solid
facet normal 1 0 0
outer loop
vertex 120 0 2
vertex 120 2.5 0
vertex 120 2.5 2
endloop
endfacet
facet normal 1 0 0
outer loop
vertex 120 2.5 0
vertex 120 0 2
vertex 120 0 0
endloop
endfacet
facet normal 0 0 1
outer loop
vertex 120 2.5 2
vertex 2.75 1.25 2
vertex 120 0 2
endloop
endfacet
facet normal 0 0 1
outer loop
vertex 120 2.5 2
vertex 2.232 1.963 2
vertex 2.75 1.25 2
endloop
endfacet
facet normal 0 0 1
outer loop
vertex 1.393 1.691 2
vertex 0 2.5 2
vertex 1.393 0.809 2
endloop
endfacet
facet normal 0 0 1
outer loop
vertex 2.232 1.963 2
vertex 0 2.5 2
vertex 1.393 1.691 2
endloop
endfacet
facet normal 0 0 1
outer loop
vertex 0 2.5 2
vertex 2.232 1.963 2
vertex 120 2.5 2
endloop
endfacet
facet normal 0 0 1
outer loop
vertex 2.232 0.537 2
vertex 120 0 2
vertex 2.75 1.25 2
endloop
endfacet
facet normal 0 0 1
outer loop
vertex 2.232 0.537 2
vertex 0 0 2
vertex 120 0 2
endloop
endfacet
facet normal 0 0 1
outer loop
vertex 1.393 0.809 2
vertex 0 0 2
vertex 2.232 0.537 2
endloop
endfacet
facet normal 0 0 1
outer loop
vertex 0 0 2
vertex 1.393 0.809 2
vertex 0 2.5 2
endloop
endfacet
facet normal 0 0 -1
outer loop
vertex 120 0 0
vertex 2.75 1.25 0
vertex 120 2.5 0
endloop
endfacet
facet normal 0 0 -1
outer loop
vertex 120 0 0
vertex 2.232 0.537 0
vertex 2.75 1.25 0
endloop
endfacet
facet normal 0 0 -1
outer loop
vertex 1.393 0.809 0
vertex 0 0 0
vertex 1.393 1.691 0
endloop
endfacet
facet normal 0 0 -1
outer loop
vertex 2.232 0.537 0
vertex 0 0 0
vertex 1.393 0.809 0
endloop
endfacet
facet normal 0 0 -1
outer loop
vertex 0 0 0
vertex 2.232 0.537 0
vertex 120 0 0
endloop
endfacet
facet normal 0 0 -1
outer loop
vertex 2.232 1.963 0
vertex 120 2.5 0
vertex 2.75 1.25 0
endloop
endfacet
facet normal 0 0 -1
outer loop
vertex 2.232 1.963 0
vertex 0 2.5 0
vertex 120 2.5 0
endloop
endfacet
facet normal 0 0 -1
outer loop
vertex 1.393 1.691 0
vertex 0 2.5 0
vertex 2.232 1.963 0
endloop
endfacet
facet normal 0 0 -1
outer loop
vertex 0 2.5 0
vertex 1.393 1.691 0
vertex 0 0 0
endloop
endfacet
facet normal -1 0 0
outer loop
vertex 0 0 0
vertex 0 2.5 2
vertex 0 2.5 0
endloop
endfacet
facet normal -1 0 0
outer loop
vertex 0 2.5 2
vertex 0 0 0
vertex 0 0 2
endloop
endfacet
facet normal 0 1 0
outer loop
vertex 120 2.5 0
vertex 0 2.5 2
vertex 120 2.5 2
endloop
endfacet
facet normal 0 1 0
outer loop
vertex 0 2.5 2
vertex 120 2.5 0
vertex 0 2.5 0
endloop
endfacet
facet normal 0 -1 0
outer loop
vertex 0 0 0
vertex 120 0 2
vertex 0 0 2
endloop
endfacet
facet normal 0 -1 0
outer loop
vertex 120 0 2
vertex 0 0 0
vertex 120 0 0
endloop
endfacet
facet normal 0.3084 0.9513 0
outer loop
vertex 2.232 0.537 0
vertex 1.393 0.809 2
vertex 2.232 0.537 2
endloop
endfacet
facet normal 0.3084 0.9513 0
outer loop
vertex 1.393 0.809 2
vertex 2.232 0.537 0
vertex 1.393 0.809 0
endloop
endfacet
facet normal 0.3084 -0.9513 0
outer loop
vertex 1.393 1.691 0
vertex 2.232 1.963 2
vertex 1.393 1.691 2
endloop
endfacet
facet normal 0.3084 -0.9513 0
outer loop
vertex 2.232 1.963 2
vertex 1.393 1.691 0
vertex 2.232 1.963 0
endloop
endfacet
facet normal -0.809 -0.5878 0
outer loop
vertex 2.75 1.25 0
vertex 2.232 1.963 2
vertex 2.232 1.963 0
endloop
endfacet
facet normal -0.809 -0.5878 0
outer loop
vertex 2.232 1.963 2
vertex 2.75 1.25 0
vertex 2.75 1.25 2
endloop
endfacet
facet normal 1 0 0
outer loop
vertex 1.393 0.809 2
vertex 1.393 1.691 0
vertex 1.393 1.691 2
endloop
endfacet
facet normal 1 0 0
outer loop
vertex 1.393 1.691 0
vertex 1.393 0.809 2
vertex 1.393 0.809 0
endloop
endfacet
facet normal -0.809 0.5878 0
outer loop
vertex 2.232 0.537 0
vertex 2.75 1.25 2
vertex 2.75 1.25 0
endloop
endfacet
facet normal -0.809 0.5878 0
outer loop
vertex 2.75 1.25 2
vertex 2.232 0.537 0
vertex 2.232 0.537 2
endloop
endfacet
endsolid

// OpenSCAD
difference() {
    cube([120,2.5,2]);
    translate([2,1.25,-2])cylinder(4,0.75,0.75);
}
